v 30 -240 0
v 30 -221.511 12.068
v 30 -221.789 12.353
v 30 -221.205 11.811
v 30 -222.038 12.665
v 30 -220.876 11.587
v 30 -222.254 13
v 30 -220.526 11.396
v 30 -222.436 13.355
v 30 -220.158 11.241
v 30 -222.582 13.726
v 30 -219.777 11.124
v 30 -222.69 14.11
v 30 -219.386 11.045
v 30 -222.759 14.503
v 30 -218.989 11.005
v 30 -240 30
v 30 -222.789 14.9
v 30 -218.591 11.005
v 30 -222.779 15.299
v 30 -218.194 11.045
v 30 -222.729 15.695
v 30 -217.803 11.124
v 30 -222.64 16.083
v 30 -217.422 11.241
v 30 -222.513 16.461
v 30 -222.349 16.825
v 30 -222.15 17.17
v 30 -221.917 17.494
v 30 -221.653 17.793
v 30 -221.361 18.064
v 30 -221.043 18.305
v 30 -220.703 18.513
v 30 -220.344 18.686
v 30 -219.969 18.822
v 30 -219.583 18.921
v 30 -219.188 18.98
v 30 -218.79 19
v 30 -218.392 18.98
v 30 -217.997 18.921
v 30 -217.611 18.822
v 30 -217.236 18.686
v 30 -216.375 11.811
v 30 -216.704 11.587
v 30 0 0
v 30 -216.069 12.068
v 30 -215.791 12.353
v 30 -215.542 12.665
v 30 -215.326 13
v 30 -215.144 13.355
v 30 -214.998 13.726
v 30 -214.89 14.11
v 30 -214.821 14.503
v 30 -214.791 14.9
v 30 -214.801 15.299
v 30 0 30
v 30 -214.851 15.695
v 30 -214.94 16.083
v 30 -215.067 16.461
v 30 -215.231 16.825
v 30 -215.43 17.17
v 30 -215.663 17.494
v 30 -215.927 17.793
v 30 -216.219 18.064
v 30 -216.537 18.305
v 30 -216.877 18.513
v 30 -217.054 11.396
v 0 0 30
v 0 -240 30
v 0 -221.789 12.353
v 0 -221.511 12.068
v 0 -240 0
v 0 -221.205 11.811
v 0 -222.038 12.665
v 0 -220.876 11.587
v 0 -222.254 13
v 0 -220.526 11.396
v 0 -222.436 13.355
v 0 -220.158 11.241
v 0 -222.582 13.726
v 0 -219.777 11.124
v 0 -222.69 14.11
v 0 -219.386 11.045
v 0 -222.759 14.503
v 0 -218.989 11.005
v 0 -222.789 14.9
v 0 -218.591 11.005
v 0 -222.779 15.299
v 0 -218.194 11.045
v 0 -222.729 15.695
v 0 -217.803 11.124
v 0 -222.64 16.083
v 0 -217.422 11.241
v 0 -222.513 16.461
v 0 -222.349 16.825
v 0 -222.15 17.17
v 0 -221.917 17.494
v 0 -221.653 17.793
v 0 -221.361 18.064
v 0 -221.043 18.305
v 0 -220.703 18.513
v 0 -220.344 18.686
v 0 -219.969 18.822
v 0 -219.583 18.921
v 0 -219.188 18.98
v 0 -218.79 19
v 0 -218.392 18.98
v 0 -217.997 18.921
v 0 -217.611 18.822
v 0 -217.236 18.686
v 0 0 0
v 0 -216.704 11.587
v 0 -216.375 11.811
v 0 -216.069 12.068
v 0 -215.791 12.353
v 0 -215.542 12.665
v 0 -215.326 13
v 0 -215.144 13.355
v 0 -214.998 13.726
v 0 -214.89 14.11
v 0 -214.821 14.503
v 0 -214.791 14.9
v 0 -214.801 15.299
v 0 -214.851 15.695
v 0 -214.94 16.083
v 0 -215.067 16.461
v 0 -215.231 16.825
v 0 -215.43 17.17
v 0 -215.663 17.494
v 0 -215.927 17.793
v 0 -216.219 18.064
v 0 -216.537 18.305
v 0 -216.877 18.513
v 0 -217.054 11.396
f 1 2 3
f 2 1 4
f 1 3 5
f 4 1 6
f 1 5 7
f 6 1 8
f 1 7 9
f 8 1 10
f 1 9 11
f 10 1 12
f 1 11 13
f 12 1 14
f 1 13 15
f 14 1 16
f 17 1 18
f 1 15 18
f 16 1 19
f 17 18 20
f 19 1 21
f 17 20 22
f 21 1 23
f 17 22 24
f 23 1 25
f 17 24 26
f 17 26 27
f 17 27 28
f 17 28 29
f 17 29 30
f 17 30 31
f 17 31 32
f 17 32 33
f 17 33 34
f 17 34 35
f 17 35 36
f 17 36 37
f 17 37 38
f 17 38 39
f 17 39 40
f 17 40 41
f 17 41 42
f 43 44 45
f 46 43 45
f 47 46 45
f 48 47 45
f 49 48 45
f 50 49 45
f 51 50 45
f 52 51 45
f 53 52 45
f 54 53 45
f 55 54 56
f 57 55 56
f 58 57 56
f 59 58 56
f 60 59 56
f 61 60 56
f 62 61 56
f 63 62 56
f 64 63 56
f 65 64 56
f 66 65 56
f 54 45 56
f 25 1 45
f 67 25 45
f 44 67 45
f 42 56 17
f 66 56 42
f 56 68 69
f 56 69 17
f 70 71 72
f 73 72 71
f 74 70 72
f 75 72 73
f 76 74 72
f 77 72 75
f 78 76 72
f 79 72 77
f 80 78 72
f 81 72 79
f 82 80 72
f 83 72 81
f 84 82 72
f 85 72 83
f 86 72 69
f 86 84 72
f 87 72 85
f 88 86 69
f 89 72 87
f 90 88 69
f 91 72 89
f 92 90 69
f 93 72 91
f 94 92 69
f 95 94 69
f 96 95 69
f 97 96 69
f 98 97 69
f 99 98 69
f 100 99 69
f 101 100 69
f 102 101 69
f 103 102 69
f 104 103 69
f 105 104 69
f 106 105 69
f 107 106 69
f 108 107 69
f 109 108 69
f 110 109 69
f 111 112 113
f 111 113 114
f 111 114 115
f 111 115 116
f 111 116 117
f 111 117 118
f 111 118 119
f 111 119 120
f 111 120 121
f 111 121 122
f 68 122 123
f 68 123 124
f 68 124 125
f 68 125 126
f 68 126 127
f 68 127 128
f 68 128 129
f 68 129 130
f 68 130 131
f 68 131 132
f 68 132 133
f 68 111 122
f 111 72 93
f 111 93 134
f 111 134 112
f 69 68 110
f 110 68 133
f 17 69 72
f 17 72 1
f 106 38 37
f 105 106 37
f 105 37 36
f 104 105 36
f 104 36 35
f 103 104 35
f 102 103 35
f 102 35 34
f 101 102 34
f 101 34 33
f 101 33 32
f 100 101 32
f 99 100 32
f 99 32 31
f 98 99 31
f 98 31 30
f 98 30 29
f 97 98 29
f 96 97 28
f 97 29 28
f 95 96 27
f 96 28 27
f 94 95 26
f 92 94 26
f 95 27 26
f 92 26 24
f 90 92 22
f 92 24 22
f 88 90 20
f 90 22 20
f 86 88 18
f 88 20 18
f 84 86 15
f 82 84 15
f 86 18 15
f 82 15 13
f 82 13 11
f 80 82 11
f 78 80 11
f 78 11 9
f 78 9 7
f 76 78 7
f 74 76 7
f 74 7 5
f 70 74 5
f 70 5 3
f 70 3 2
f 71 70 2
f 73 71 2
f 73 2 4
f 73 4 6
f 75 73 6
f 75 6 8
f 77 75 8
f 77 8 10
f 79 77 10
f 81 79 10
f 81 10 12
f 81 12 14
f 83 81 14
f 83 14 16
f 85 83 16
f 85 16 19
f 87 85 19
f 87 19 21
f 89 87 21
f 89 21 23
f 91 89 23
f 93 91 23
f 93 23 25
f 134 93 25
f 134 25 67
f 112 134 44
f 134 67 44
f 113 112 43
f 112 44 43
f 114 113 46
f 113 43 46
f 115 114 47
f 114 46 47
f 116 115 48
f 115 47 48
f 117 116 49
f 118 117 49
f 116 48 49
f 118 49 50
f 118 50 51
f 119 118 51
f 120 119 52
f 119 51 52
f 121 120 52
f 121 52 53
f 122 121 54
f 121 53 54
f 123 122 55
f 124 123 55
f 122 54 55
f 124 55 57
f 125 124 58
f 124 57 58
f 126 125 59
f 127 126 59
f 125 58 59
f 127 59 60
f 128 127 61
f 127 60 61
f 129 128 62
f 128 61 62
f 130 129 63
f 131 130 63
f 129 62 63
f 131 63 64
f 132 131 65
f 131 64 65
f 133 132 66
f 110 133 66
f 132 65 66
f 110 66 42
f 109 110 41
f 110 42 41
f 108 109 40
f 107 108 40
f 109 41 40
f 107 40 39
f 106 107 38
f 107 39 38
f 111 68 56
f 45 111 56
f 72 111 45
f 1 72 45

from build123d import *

# Parameters (mm, degrees)
SKETCH_W     = 30
SKETCH_H     = 30
PAD_DEPTH    = 240
SKETCH001_R  = 4
POCKET_DEPTH = 30.001


with BuildPart() as part:
    # Sketch → Pad (new body)
    with BuildSketch(Plane.XZ):
        with Locations((15, 15)):
            Rectangle(SKETCH_W, SKETCH_H)
    extrude(amount=PAD_DEPTH)

    # Sketch001 (on Face2 of Pad) → Pocket (cut, through all)
    with BuildSketch(Plane(origin=(30, 0, 0), x_dir=(0, 0, 1), z_dir=(1, 0, 0))):
        with Locations((15, 218.79)):
            Circle(SKETCH001_R)
    extrude(amount=-POCKET_DEPTH, mode=Mode.SUBTRACT)


solid = part.part
